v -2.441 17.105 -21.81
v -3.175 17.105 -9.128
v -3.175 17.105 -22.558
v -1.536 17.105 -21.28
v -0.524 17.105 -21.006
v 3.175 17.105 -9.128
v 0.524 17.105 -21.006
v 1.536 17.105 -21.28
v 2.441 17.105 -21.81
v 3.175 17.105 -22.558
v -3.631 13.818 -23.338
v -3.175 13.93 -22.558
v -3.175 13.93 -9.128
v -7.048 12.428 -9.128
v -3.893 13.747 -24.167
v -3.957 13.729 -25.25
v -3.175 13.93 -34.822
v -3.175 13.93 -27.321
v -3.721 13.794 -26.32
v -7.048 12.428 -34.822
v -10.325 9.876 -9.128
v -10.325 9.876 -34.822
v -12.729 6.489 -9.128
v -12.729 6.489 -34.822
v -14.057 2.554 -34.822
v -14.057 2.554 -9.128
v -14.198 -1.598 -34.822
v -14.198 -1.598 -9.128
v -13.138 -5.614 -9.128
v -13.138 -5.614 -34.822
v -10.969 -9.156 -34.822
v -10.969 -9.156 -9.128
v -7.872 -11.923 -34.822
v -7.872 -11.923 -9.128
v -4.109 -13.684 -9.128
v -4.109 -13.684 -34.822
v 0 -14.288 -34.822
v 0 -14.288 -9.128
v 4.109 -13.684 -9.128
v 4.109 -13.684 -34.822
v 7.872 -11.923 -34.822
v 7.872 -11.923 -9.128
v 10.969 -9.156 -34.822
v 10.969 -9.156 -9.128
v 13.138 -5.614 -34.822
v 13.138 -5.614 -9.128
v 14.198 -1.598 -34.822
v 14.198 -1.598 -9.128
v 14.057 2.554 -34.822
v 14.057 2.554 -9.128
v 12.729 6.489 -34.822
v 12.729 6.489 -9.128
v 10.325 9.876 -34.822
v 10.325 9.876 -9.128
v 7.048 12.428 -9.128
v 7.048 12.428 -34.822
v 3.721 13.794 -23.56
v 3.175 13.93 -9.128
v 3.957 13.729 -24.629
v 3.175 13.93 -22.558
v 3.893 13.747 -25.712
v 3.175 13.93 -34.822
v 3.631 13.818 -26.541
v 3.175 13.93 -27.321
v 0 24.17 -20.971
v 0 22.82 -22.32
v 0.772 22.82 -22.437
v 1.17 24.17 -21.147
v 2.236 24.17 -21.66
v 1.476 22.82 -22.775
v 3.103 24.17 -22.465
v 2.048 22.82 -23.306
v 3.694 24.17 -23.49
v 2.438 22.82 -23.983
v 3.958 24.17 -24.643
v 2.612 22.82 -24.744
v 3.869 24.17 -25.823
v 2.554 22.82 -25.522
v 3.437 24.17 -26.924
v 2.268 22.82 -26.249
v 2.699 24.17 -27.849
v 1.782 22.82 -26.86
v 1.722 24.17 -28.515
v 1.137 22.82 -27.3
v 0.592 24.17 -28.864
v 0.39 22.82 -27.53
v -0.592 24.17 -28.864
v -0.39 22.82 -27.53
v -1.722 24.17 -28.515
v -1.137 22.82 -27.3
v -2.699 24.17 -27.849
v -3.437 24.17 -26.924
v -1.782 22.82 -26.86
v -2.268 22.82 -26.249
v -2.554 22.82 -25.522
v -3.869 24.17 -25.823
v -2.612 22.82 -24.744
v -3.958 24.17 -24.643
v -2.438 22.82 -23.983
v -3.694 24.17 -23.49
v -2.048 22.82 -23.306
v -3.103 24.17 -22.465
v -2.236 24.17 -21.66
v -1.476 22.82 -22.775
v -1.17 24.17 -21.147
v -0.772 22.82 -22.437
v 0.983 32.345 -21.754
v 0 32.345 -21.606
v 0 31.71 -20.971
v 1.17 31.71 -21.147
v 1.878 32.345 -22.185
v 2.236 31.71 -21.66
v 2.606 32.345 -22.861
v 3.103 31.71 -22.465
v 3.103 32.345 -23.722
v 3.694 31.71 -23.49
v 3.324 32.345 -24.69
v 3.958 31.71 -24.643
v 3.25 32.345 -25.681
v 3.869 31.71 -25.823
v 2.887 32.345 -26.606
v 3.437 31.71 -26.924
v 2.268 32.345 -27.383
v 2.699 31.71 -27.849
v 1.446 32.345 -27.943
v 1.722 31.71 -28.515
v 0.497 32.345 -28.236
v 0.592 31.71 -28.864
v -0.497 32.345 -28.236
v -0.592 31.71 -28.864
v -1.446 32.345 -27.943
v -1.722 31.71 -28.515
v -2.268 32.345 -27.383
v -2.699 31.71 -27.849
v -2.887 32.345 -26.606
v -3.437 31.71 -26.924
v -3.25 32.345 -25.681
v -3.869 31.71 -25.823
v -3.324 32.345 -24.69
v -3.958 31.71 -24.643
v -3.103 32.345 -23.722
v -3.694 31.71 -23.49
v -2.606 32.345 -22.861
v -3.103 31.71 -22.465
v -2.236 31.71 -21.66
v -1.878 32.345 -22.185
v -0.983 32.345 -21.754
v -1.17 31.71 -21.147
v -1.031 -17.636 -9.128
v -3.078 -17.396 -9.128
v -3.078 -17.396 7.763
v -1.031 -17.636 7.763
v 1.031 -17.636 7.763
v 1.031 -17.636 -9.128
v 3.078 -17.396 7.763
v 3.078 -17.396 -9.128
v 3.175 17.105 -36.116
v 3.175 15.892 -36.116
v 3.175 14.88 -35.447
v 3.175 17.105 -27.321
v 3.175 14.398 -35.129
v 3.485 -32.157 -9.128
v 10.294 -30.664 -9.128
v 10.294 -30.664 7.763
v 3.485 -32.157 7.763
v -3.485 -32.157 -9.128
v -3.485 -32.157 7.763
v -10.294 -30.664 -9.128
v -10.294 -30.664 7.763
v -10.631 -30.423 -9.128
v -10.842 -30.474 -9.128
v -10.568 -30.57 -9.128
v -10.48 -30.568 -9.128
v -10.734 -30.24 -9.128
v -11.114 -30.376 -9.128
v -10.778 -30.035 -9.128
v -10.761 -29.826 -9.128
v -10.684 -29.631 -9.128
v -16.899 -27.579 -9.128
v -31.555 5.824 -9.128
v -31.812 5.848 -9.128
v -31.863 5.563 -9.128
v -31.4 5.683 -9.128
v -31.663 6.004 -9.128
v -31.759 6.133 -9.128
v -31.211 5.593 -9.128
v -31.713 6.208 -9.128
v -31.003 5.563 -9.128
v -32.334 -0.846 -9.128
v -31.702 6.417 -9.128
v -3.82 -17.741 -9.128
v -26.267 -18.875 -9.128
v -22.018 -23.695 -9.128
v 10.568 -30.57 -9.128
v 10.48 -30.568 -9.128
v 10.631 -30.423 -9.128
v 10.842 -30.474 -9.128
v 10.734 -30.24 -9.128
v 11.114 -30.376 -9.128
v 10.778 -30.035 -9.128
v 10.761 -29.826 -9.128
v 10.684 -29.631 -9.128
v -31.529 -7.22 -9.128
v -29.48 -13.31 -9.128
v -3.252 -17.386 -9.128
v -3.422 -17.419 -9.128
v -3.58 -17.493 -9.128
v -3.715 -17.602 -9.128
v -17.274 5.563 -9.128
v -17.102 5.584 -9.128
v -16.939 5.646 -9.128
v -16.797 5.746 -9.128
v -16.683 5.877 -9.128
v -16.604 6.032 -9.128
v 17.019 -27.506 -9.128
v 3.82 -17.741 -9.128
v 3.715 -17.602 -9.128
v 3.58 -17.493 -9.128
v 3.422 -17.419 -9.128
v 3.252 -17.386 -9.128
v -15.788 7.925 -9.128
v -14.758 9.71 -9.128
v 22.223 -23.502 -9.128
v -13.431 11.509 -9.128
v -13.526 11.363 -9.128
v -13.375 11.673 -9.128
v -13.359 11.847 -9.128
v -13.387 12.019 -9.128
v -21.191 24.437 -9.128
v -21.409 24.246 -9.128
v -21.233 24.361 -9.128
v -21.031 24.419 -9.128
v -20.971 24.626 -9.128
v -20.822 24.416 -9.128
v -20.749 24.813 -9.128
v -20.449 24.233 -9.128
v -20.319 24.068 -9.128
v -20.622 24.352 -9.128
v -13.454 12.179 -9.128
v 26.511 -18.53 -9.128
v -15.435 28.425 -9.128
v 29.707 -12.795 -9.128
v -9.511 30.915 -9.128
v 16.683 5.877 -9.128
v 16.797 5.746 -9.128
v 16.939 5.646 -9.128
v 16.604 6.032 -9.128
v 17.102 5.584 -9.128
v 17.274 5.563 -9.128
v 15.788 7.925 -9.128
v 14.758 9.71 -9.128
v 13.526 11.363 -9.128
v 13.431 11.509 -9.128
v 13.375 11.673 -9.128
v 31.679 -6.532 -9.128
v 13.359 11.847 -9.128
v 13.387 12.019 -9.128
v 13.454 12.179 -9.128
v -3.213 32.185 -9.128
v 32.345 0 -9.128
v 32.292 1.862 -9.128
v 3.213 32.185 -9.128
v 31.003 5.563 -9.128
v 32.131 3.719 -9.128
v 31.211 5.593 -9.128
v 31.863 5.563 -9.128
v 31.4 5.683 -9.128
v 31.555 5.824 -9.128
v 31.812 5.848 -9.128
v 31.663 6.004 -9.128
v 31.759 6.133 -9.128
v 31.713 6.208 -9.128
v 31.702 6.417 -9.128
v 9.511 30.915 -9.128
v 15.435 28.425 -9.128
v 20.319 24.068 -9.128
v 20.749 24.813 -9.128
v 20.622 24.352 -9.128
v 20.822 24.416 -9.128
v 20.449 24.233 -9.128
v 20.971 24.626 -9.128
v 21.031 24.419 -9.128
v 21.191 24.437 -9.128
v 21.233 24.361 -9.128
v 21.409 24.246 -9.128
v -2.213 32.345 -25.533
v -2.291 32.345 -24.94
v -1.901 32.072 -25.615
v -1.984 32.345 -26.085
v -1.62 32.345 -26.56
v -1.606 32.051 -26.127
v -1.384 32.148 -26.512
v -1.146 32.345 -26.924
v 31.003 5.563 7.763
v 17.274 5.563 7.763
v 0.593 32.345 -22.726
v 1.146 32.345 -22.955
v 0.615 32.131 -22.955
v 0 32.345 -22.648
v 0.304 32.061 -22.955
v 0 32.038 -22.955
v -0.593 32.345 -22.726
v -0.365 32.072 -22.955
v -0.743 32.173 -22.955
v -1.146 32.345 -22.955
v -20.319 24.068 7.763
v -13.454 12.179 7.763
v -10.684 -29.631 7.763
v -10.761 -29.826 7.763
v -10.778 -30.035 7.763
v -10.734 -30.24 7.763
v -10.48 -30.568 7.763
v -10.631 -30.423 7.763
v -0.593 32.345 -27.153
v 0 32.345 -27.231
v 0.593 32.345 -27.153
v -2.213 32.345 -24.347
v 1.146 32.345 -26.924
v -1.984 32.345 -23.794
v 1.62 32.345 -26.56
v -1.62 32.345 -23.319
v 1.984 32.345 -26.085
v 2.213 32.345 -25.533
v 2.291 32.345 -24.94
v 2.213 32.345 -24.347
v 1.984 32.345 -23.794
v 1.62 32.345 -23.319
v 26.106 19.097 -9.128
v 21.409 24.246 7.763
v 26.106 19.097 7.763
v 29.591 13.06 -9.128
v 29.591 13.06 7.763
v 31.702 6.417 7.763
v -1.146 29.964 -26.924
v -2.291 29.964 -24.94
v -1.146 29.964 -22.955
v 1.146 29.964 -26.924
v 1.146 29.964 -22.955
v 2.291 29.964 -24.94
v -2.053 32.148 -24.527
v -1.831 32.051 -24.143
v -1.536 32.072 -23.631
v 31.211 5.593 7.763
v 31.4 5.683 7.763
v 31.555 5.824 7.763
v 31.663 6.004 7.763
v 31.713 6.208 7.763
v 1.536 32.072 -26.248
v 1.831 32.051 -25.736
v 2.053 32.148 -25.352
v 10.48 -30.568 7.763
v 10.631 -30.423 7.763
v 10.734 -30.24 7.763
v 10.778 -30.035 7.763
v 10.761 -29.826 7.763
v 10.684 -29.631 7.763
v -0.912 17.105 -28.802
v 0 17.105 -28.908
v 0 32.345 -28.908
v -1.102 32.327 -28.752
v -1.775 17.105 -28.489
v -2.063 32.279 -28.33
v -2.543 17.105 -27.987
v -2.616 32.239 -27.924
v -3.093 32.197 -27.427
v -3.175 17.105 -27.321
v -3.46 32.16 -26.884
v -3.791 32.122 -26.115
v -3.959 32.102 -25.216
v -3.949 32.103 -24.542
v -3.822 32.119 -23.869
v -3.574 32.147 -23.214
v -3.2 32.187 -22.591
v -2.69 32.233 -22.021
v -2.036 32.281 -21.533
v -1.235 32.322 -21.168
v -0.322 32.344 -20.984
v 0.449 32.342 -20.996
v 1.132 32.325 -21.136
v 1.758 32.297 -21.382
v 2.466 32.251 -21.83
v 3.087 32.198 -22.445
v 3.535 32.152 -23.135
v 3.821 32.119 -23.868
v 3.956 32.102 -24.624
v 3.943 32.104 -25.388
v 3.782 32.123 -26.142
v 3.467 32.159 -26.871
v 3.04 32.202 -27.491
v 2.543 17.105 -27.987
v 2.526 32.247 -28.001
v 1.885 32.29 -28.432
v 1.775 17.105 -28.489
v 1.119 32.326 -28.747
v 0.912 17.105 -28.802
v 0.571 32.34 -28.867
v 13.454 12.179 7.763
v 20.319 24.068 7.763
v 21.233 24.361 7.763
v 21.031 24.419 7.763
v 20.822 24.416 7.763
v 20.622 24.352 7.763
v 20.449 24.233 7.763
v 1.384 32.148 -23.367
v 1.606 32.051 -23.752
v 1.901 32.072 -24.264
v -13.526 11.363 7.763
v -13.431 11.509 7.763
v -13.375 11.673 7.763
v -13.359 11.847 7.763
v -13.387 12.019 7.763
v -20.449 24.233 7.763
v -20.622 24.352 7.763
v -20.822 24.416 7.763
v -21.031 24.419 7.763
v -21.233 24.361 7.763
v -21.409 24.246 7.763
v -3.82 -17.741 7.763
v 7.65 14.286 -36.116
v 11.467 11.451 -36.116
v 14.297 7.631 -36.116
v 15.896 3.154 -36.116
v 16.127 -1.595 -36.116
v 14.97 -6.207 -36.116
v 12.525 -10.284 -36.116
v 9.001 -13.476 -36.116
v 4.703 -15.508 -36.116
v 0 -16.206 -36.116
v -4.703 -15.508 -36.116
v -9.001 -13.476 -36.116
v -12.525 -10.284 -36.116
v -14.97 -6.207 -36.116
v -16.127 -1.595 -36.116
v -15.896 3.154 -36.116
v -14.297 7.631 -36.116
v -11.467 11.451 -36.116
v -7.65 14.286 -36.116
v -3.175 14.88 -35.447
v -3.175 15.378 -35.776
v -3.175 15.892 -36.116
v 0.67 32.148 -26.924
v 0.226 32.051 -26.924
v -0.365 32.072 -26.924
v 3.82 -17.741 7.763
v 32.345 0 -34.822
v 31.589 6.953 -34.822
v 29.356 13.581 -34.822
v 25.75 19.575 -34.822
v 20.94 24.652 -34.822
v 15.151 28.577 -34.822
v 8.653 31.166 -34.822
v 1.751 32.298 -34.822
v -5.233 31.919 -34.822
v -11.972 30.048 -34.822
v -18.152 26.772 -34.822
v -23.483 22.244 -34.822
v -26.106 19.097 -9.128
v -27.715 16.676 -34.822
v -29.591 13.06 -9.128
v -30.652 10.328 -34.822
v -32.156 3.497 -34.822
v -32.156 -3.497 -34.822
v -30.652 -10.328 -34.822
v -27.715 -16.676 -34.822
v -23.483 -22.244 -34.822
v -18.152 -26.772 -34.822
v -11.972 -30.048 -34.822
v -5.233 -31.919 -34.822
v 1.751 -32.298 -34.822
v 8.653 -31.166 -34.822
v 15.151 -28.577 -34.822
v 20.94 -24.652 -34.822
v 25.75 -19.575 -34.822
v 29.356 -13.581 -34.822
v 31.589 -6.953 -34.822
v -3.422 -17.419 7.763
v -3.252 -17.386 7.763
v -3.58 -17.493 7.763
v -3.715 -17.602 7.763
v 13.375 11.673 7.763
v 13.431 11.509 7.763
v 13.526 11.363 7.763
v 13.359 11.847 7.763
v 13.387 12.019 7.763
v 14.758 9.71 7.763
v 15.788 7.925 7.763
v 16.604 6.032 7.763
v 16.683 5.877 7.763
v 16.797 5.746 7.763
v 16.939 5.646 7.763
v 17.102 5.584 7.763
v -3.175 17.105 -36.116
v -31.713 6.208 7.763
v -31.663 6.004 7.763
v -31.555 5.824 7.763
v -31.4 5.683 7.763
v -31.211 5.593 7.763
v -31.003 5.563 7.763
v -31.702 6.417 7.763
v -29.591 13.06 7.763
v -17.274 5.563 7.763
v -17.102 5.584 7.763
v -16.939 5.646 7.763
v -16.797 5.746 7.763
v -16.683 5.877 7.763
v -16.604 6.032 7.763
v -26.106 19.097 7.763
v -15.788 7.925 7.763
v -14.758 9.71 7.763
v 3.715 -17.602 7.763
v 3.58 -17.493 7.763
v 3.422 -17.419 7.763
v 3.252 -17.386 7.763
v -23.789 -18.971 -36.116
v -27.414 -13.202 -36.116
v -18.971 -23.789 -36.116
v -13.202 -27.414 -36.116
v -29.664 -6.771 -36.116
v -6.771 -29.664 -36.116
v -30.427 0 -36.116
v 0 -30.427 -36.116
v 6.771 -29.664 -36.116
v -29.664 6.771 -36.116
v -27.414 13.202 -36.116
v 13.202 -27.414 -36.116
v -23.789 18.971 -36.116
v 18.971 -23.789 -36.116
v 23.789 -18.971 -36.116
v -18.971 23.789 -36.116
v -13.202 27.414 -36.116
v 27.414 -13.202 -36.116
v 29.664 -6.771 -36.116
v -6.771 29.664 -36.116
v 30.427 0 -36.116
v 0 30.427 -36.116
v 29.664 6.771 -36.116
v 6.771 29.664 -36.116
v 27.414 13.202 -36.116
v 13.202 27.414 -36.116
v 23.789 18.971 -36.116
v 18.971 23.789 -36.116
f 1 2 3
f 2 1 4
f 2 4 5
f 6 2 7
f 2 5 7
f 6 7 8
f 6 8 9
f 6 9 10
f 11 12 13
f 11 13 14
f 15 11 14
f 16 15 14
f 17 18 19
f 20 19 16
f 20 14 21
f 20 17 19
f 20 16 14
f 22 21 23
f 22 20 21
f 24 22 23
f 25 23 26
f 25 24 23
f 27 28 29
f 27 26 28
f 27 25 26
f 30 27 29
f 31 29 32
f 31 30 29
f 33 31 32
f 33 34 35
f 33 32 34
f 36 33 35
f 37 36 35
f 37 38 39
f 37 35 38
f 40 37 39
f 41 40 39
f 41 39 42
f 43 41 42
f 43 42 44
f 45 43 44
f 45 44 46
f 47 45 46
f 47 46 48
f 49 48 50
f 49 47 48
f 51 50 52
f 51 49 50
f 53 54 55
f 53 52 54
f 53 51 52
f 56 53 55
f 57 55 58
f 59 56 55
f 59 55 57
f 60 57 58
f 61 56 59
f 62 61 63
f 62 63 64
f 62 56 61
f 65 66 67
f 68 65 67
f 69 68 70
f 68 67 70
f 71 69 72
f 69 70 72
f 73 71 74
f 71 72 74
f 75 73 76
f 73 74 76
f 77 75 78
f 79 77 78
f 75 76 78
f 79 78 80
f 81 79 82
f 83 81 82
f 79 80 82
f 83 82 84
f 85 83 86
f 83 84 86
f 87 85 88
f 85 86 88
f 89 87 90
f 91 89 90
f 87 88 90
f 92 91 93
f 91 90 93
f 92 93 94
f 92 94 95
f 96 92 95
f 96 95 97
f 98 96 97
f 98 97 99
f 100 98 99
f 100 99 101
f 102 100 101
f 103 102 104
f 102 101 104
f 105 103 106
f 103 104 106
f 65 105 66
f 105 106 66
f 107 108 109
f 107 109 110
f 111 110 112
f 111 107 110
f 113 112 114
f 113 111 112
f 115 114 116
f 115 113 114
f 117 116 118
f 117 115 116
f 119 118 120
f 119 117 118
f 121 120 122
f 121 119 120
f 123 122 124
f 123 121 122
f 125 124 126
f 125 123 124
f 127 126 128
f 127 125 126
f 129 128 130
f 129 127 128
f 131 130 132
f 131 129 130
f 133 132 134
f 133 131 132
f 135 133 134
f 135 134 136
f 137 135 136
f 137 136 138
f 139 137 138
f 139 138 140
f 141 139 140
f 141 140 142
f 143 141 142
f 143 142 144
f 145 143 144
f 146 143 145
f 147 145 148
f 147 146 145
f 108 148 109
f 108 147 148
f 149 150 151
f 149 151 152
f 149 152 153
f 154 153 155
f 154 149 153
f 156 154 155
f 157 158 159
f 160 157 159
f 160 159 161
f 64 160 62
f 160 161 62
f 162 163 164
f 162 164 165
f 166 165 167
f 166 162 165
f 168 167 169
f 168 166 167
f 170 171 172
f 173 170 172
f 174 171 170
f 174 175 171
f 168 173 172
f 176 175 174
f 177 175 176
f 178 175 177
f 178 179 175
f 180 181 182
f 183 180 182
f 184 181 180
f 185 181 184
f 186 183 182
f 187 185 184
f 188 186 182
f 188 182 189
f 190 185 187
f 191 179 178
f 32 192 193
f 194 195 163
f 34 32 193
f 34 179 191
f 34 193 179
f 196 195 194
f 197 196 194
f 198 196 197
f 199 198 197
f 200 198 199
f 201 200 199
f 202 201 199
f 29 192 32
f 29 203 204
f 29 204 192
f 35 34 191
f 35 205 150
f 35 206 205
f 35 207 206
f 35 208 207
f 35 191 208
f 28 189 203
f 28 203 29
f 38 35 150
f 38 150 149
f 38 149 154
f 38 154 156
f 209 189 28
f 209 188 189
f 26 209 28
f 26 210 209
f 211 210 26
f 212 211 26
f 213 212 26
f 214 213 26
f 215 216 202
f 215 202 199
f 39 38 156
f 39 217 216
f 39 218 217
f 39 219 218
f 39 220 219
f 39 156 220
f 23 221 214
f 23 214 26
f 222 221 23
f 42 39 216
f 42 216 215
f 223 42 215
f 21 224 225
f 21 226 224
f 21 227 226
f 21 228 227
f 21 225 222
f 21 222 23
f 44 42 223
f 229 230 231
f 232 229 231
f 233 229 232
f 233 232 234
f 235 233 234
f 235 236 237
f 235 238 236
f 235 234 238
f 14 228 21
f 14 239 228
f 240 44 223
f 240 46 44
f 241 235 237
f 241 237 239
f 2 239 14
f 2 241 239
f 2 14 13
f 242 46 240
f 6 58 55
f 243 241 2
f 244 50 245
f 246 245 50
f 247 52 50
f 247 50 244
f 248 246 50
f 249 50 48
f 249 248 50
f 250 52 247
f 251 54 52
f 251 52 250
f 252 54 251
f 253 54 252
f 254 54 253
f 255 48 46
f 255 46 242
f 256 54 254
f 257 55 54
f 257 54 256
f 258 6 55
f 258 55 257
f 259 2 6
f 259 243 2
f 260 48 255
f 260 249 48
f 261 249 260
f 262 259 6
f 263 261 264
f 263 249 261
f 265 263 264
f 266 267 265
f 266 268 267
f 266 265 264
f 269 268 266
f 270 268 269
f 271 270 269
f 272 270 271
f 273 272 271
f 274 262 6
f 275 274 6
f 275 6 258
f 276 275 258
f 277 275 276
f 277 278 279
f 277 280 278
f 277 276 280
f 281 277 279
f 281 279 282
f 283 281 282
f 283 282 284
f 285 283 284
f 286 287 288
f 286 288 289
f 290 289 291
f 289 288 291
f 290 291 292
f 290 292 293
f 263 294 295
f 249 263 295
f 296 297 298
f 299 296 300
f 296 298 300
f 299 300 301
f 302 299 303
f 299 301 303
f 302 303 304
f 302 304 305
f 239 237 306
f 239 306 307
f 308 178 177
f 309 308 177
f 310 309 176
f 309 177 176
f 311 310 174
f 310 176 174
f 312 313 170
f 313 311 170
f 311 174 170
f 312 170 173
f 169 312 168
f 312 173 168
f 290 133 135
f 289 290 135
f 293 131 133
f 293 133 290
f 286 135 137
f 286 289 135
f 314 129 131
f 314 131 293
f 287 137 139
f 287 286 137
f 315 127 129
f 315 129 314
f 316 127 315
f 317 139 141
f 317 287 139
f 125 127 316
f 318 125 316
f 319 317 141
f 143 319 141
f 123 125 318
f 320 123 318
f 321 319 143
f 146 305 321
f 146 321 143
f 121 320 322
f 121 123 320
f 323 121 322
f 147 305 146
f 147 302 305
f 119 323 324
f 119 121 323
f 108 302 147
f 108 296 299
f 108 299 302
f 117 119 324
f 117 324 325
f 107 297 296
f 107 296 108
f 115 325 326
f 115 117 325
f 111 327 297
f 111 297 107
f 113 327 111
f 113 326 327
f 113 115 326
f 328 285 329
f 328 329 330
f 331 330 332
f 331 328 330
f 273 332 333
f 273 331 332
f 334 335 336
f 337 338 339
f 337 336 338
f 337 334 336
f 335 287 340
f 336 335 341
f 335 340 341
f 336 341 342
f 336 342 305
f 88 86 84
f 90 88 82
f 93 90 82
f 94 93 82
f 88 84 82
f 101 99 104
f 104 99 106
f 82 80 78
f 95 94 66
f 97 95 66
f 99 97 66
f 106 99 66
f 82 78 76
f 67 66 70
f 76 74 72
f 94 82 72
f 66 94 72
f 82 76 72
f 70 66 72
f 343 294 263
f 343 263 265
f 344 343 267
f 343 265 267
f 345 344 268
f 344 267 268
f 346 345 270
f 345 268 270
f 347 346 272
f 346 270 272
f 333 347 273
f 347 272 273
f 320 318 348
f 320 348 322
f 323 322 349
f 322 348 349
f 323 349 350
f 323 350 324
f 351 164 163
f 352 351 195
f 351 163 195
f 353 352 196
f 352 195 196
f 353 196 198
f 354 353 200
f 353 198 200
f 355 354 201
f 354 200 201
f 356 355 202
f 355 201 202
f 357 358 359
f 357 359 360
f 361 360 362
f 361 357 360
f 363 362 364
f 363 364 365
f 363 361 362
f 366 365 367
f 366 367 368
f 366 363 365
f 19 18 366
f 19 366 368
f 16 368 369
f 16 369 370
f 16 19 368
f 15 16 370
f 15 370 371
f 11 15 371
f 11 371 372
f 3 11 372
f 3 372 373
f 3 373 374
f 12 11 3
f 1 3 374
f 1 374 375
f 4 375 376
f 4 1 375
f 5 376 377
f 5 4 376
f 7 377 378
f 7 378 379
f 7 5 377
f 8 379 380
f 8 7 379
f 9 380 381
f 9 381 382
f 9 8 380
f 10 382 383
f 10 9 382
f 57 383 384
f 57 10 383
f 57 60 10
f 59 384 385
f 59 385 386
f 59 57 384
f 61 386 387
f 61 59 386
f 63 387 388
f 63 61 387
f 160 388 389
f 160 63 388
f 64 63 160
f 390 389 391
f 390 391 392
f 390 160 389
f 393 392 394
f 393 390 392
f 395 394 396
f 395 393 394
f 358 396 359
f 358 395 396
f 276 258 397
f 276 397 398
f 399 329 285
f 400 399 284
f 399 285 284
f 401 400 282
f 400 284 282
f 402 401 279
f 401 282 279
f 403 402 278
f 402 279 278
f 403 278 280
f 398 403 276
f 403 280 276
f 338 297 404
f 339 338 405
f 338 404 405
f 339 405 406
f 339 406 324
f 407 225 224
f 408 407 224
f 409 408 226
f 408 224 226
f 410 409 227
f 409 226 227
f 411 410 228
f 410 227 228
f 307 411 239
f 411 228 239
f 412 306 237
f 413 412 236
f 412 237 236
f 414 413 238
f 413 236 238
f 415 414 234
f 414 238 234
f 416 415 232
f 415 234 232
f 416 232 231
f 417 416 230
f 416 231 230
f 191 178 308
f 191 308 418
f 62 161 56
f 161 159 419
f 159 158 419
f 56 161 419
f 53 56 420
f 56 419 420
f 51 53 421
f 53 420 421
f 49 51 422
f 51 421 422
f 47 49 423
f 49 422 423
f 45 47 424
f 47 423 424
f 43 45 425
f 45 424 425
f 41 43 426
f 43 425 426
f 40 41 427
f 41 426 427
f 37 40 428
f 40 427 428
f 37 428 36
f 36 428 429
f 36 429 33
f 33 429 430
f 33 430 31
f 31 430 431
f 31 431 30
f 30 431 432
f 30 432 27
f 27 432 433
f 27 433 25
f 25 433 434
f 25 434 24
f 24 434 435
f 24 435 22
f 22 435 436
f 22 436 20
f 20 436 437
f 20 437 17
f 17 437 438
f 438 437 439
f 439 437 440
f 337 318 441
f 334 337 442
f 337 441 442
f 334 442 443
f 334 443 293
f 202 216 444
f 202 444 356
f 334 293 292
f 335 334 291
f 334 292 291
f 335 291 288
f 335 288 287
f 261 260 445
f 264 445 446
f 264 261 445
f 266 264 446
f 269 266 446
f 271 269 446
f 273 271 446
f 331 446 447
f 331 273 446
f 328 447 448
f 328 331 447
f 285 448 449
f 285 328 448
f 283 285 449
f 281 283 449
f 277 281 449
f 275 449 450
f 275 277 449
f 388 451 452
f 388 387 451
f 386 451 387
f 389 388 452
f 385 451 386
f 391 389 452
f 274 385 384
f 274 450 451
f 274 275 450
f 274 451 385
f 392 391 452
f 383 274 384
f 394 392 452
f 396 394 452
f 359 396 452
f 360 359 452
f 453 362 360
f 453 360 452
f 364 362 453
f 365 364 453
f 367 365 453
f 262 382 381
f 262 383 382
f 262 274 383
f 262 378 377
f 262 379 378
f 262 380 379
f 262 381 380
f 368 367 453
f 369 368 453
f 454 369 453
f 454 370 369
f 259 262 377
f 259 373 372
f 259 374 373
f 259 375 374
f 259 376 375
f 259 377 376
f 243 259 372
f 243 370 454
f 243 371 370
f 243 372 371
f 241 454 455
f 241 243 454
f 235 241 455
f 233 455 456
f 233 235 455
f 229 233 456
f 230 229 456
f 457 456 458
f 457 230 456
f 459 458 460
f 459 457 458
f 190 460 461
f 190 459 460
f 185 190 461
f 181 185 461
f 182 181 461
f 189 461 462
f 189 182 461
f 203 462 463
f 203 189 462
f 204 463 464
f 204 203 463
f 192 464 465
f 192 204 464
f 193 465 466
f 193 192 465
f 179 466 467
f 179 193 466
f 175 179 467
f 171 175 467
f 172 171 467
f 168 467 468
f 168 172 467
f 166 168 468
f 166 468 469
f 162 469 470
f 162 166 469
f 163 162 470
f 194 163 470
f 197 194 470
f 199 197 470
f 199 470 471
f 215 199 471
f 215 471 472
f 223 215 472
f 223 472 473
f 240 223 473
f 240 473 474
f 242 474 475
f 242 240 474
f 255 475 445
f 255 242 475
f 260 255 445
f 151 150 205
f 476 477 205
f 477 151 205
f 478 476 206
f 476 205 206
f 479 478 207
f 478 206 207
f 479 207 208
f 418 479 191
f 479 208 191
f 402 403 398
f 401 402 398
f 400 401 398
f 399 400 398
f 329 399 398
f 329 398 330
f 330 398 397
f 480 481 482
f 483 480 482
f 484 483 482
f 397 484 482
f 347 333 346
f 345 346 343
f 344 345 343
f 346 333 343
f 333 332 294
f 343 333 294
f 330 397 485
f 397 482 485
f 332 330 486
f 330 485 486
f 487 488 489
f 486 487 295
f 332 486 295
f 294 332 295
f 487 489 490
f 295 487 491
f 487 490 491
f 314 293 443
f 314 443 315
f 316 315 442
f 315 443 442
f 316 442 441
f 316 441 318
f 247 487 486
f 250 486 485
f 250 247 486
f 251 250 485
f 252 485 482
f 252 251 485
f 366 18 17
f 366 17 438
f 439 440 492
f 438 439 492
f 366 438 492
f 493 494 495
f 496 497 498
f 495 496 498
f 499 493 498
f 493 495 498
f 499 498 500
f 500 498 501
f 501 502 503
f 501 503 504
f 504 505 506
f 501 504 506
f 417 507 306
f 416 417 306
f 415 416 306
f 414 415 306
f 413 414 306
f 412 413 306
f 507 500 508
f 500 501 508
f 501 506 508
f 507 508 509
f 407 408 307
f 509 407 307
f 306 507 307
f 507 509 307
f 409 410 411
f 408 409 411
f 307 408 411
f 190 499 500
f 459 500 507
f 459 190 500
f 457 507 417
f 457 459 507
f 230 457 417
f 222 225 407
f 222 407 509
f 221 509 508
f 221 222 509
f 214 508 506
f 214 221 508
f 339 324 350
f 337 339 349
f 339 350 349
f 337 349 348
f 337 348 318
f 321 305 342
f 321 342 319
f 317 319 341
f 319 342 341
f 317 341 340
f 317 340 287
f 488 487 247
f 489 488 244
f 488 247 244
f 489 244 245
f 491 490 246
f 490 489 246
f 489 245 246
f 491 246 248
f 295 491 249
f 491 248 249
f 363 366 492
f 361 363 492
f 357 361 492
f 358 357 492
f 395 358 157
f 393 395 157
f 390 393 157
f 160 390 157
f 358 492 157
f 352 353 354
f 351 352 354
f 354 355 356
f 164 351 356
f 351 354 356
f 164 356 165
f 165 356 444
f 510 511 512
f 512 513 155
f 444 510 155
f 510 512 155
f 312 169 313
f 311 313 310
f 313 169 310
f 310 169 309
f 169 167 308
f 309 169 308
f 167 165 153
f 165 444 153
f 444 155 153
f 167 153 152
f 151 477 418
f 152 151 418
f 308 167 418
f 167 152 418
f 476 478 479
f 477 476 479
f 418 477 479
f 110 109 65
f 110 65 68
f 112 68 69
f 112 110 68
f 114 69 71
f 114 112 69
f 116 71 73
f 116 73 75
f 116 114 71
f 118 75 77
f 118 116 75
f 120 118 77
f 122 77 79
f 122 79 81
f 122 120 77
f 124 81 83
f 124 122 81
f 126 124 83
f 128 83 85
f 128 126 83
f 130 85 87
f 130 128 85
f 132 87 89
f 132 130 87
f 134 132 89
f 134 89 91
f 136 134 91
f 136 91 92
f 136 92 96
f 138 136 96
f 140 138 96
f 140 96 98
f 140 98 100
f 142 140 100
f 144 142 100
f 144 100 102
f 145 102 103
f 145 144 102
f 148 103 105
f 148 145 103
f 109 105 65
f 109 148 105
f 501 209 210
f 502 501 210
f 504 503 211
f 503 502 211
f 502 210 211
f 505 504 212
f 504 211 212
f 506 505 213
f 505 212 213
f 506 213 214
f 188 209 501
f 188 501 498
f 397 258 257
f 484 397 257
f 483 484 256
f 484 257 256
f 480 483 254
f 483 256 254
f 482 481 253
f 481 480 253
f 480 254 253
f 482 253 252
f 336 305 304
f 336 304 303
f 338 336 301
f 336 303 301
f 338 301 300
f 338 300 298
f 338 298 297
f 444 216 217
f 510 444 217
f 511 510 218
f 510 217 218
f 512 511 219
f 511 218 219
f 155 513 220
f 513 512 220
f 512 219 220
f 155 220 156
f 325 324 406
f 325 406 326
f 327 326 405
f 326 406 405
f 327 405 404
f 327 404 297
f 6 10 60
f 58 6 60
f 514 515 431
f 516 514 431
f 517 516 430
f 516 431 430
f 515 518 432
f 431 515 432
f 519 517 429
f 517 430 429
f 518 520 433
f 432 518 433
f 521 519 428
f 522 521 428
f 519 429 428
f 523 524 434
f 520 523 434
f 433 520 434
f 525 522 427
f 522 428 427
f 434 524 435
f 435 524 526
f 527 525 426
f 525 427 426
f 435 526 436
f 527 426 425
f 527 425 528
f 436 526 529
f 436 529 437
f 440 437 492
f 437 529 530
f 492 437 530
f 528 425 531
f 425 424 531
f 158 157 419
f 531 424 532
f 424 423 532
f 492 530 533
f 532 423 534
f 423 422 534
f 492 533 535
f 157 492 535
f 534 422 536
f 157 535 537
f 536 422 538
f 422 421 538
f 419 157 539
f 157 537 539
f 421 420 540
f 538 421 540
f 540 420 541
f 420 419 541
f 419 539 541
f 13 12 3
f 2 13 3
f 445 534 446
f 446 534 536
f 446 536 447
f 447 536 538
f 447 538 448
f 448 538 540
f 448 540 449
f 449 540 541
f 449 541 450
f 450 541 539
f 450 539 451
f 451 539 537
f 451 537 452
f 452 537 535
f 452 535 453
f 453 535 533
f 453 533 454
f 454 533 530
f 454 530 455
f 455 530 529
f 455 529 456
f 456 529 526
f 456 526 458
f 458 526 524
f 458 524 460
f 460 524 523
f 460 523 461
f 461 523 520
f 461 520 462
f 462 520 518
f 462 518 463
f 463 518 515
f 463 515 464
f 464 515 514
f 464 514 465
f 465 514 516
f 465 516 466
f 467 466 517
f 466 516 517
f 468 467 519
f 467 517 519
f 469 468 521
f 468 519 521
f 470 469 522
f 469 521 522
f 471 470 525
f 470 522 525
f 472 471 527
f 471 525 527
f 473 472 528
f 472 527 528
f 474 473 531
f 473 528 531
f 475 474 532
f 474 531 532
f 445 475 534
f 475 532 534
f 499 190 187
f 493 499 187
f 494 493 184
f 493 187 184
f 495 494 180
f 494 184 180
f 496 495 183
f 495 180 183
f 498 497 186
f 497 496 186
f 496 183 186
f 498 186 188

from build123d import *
from OCP.BRepFilletAPI import BRepFilletAPI_MakeChamfer

# Parameters (mm, degrees)
BOSS_EXTRUDE1_START      = -9.128125
SKETCH1_R                = 32.3453125
BOSS_EXTRUDE1_DEPTH      = 26.9875
BOSS_EXTRUDE2_DEPTH      = 16.891
FILLET1_R                = 0.713235825
CIRPATTERN1_COUNT        = 3
FILLET1_OF_CIRPATTERN1_R = 0.713235825
CUT_EXTRUDE5_DEPTH       = 59.281874117
CUT_EXTRUDE5_DEPTH_BACK  = 59.281874117
SKETCH15_R               = 14.2875
CHAMFER1_SIZE            = 1.2938125
CHAMFER1_SIZE2           = 1.918155913
CUT_EXTRUDE1_DEPTH       = 59.281874117
CUT_EXTRUDE1_DEPTH_BACK  = 59.281874117
SKETCH5_R                = 3.96875
CUT_EXTRUDE2_DEPTH       = 59.281874117
SKETCH6_R                = 3.96875
BOSS_EXTRUDE3_DEPTH      = 9.525
CUT_EXTRUDE3_DEPTH       = 2.38125
CHAMFER3_SIZE            = 0.635
CHAMFER4_SIZE            = 1.349375


with BuildPart() as part:
    # Sketch1 → Boss-Extrude1 (new body)
    with BuildSketch(Plane.XY.offset(BOSS_EXTRUDE1_START)):
        Circle(SKETCH1_R)
    extrude(amount=-BOSS_EXTRUDE1_DEPTH)

    # Sketch2 → Boss-Extrude2 (add)
    with BuildSketch(Plane.XY.offset(-9.128125)):
        with BuildLine():
            Line((-11.114350717, -30.375820135), (-3.566179127, -17.302003437))
            ThreePointArc((-3.566179127, -17.302003437), (0, -17.6657), (3.566179127, -17.302003437))
            Line((3.566179127, -17.302003437), (11.114350717, -30.375820135))
            ThreePointArc((11.114350717, -30.375820135), (0, -32.3453125), (-11.114350717, -30.375820135))
        make_face()
    boss_extrude2 = extrude(amount=BOSS_EXTRUDE2_DEPTH)

    # Fillet1
    # the kernel refuses this fillet: 0.713235825 mm, written as the material it takes off along each edge
    with BuildSketch(Plane(origin=(-11.114350717, -30.375820135, -9.128125), x_dir=(0.9436455754007305, -0.3309577435664929, 0), z_dir=(0, 0, 1))) as fillet1_piece_1:
        with BuildLine():
            CenterArc((0.860200247, 0.713171354), FILLET1_R, 169.326916929, 101.443469756)
            Line((0.159303464, 0.845266176), (0, 0))
            ThreePointArc((0, 0), (0.434894987, -0.002923796), (0.869789973, 0))
        make_face()
    extrude(amount=19.065474933, mode=Mode.SUBTRACT)
    with BuildSketch(Plane(origin=(11.114350717, -30.375820135, -9.128125), x_dir=(-0.9436455754007282, -0.3309577435664989, 0), z_dir=(0, 0, 1))) as fillet1_piece_2:
        with BuildLine():
            CenterArc((0.860200247, -0.713171354), FILLET1_R, 89.229613314, 101.443469756)
            Line((0.159303464, -0.845266176), (0, 0))
            ThreePointArc((0, 0), (0.434894987, 0.002923796), (0.869789973, 0))
        make_face()
    extrude(amount=19.065474933, mode=Mode.SUBTRACT)
    with BuildSketch(Plane(origin=(3.566179127, -17.302003437, -9.128125), x_dir=(0.500000000000002, -0.8660254037844376, 0), z_dir=(0, 0, 1))) as fillet1_piece_3:
        with BuildLine():
            CenterArc((0.507170112, -0.713235825), FILLET1_R, 90, 70.033604576)
            ThreePointArc((-0.163195289, -0.469687941), (-0.07994504, -0.235418176), (0, 0))
            Line((0, 0), (0.507170112, 0))
        make_face()
    extrude(amount=18.158925279, mode=Mode.SUBTRACT)
    with BuildSketch(Plane(origin=(-3.566179127, -17.302003437, -9.128125), x_dir=(0.9821562739684868, -0.18806661985673784, 0), z_dir=(0, 0, 1))) as fillet1_piece_4:
        with BuildLine():
            CenterArc((0.507269431, -0.71316519), FILLET1_R, 90.806371221, 70.033604577)
            Line((-0.166457119, -0.479075724), (0, 0))
            ThreePointArc((0, 0), (0.248615901, -0.001749518), (0.497231801, 0))
        make_face()
    extrude(amount=18.158925279, mode=Mode.SUBTRACT)

    # CirPattern1: Boss-Extrude2 ×3 about axis
    cirpattern1_axis = Axis((0, 0, 0), (0, 0, 1))
    for i in range(1, CIRPATTERN1_COUNT):
        add(boss_extrude2.rotate(cirpattern1_axis, i * 360 / CIRPATTERN1_COUNT))

    # Fillet1 of CirPattern1
    # the kernel refuses this fillet: 0.713235825 mm, written as the material it takes off along each edge
    with BuildSketch(Plane(origin=(31.863407256, 5.5626, -9.128125), x_dir=(-0.18520497419260348, 0.9826999122490635, 0), z_dir=(0, 0, 1)), Plane(origin=(-20.749056539, 24.813220135, -9.128125), x_dir=(-0.7584406012081224, -0.6517421686825718, 0), z_dir=(0, 0, 1))) as fillet1_of_cirpattern1_piece_1:
        with BuildLine():
            CenterArc((0.860200247, 0.713171354), FILLET1_OF_CIRPATTERN1_R, 169.326916929, 101.443469756)
            Line((0.159303464, 0.845266176), (0, 0))
            ThreePointArc((0, 0), (0.434894987, -0.002923796), (0.869789973, 0))
        make_face()
    extrude(amount=19.065474933, mode=Mode.SUBTRACT)
    with BuildSketch(Plane(origin=(20.749056539, 24.813220135, -9.128125), x_dir=(0.7584406012081266, -0.6517421686825667, 0), z_dir=(0, 0, 1)), Plane(origin=(-31.863407256, 5.5626, -9.128125), x_dir=(0.18520497419260348, 0.9826999122490635, 0), z_dir=(0, 0, 1))) as fillet1_of_cirpattern1_piece_2:
        with BuildLine():
            CenterArc((0.860200247, -0.713171354), FILLET1_OF_CIRPATTERN1_R, 89.229613314, 101.443469756)
            Line((0.159303464, -0.845266176), (0, 0))
            ThreePointArc((0, 0), (0.434894987, 0.002923796), (0.869789973, 0))
        make_face()
    extrude(amount=19.065474933, mode=Mode.SUBTRACT)
    with BuildSketch(Plane(origin=(13.200884949, 11.739403437, -9.128125), x_dir=(0.49999999999999967, 0.8660254037844388, 0), z_dir=(0, 0, 1)), Plane(origin=(-16.767064076, 5.5626, -9.128125), x_dir=(-1, 0, 0), z_dir=(0, 0, 1))) as fillet1_of_cirpattern1_piece_3:
        with BuildLine():
            CenterArc((0.507170112, -0.713235825), FILLET1_OF_CIRPATTERN1_R, 90, 70.033604576)
            ThreePointArc((-0.163195289, -0.469687941), (-0.07994504, -0.235418176), (0, 0))
            Line((0, 0), (0.507170112, 0))
        make_face()
    extrude(amount=18.158925279, mode=Mode.SUBTRACT)
    with BuildSketch(Plane(origin=(16.767064076, 5.5626, -9.128125), x_dir=(-0.3282076665844337, 0.9446055936713488, 0), z_dir=(0, 0, 1)), Plane(origin=(-13.200884949, 11.739403437, -9.128125), x_dir=(-0.6539486073840537, -0.7565389738146059, 0), z_dir=(0, 0, 1))) as fillet1_of_cirpattern1_piece_4:
        with BuildLine():
            CenterArc((0.507269431, -0.71316519), FILLET1_OF_CIRPATTERN1_R, 90.806371221, 70.033604577)
            Line((-0.166457119, -0.479075724), (0, 0))
            ThreePointArc((0, 0), (0.248615901, -0.001749518), (0.497231801, 0))
        make_face()
    extrude(amount=18.158925279, mode=Mode.SUBTRACT)

    # Sketch15 → Cut-Extrude5 (cut, two sides: drawn at the far end of the back side and taken through both)
    with BuildSketch(Plane.XY.offset(-CUT_EXTRUDE5_DEPTH_BACK)):
        Circle(SKETCH15_R)
    extrude(amount=CUT_EXTRUDE5_DEPTH + CUT_EXTRUDE5_DEPTH_BACK, mode=Mode.SUBTRACT)

    # Chamfer1: one chamfer whose edges measure the first distance from different faces: ONE call of the kernel's chamfer builder (chamfer() names one face for all edges)
    chamfer1_edges_1 = [part.edges().sort_by_distance(p)[0] for p in [
        (-32.3453125, 0, -36.115625),
    ]]
    chamfer1_side_1 = [part.faces().sort_by_distance(p)[0] for p in [
        (-32.3453125, 0, -22.621875),
    ]]
    chamfer1_edges_2 = [part.edges().sort_by_distance(p)[0] for p in [
        (-14.2875, 0, -36.115625),
    ]]
    chamfer1_side_2 = [part.faces().sort_by_distance(p)[0] for p in [
        (-14.2875, 0, -22.621875),
    ]]
    chamfer1 = BRepFilletAPI_MakeChamfer(part.part.solid().wrapped)
    for e in chamfer1_edges_1:
        chamfer1.Add(CHAMFER1_SIZE, CHAMFER1_SIZE2, e.wrapped, chamfer1_side_1[0].wrapped)  # the first distance lies on this face
    for e in chamfer1_edges_2:
        chamfer1.Add(CHAMFER1_SIZE, CHAMFER1_SIZE2, e.wrapped, chamfer1_side_2[0].wrapped)  # the first distance lies on this face
    add(Compound.cast(chamfer1.Shape()), mode=Mode.REPLACE)

    # Sketch4 → Cut-Extrude1 (cut, two sides: drawn at the far end of the back side and taken through both)
    with BuildSketch(Plane.XY.offset(-CUT_EXTRUDE1_DEPTH_BACK)):
        with BuildLine():
            Line((-3.175, 17.105255965), (3.175, 17.105255965))
            Line((3.175, 17.105255965), (3.175, 13.930255965))
            ThreePointArc((3.175, 13.930255965), (0, 14.2875), (-3.175, 13.930255965))
            Line((-3.175, 13.930255965), (-3.175, 17.105255965))
        make_face()
    extrude(amount=CUT_EXTRUDE1_DEPTH + CUT_EXTRUDE1_DEPTH_BACK, mode=Mode.SUBTRACT)

    # Sketch5 → Cut-Extrude2 (cut, through all)
    with BuildSketch(Plane(origin=(0, 0, 0), x_dir=(1, 0, 0), z_dir=(0, 1, 0))):
        with Locations(Location((0, 24.939625, 0), (0, 0, 90))):
            Circle(SKETCH5_R)
    extrude(amount=CUT_EXTRUDE2_DEPTH, mode=Mode.SUBTRACT)


with BuildPart() as body_2:
    # Sketch6 → Boss-Extrude3 (new body)
    with BuildSketch(Plane(origin=(0, 32.3453125, 0), x_dir=(-1, 0, 0), z_dir=(0, 1, 0))):
        with Locations(Location((0, -24.939625, 0), (0, 0, 90))):
            Circle(SKETCH6_R)
    extrude(amount=-BOSS_EXTRUDE3_DEPTH)

    # Sketch8 → Cut-Extrude3 (cut)
    with BuildSketch(Plane(origin=(0, 32.3453125, 0), x_dir=(1, 0, 0), z_dir=(0, 1, 0))):
        Polygon((1.14567944, 22.95525), (2.291358881, 24.939625), (1.14567944, 26.924), (-1.14567944, 26.924), (-2.291358881, 24.939625), (-1.14567944, 22.95525), align=None)
    extrude(amount=-CUT_EXTRUDE3_DEPTH, mode=Mode.SUBTRACT)

    # Cut-Extrude4 cone 1 section (through the dimple's axis) → Cut-Extrude4 (revolve, cut)
    with BuildSketch(Plane(origin=(0, 32.3453125, -24.939625), x_dir=(0, 0, 1), z_dir=(1, 0, 0))):
        Polygon((0, 0), (2.291358881, 0), (0, 2.291358881), align=None)
    revolve(axis=Axis((0, 32.3453125, -24.939625), (0, -1, 0)), mode=Mode.SUBTRACT)

    # Chamfer3
    chamfer3_edges = [body_2.edges().sort_by_distance(p)[0] for p in [
        (0, 32.3453125, -28.908375),
    ]]
    chamfer(chamfer3_edges, length=CHAMFER3_SIZE)

    # Chamfer4
    chamfer4_edges = [body_2.edges().sort_by_distance(p)[0] for p in [
        (0, 22.8203125, -28.908375),
    ]]
    chamfer(chamfer4_edges, length=CHAMFER4_SIZE)


solid = Compound([part.part, body_2.part])
